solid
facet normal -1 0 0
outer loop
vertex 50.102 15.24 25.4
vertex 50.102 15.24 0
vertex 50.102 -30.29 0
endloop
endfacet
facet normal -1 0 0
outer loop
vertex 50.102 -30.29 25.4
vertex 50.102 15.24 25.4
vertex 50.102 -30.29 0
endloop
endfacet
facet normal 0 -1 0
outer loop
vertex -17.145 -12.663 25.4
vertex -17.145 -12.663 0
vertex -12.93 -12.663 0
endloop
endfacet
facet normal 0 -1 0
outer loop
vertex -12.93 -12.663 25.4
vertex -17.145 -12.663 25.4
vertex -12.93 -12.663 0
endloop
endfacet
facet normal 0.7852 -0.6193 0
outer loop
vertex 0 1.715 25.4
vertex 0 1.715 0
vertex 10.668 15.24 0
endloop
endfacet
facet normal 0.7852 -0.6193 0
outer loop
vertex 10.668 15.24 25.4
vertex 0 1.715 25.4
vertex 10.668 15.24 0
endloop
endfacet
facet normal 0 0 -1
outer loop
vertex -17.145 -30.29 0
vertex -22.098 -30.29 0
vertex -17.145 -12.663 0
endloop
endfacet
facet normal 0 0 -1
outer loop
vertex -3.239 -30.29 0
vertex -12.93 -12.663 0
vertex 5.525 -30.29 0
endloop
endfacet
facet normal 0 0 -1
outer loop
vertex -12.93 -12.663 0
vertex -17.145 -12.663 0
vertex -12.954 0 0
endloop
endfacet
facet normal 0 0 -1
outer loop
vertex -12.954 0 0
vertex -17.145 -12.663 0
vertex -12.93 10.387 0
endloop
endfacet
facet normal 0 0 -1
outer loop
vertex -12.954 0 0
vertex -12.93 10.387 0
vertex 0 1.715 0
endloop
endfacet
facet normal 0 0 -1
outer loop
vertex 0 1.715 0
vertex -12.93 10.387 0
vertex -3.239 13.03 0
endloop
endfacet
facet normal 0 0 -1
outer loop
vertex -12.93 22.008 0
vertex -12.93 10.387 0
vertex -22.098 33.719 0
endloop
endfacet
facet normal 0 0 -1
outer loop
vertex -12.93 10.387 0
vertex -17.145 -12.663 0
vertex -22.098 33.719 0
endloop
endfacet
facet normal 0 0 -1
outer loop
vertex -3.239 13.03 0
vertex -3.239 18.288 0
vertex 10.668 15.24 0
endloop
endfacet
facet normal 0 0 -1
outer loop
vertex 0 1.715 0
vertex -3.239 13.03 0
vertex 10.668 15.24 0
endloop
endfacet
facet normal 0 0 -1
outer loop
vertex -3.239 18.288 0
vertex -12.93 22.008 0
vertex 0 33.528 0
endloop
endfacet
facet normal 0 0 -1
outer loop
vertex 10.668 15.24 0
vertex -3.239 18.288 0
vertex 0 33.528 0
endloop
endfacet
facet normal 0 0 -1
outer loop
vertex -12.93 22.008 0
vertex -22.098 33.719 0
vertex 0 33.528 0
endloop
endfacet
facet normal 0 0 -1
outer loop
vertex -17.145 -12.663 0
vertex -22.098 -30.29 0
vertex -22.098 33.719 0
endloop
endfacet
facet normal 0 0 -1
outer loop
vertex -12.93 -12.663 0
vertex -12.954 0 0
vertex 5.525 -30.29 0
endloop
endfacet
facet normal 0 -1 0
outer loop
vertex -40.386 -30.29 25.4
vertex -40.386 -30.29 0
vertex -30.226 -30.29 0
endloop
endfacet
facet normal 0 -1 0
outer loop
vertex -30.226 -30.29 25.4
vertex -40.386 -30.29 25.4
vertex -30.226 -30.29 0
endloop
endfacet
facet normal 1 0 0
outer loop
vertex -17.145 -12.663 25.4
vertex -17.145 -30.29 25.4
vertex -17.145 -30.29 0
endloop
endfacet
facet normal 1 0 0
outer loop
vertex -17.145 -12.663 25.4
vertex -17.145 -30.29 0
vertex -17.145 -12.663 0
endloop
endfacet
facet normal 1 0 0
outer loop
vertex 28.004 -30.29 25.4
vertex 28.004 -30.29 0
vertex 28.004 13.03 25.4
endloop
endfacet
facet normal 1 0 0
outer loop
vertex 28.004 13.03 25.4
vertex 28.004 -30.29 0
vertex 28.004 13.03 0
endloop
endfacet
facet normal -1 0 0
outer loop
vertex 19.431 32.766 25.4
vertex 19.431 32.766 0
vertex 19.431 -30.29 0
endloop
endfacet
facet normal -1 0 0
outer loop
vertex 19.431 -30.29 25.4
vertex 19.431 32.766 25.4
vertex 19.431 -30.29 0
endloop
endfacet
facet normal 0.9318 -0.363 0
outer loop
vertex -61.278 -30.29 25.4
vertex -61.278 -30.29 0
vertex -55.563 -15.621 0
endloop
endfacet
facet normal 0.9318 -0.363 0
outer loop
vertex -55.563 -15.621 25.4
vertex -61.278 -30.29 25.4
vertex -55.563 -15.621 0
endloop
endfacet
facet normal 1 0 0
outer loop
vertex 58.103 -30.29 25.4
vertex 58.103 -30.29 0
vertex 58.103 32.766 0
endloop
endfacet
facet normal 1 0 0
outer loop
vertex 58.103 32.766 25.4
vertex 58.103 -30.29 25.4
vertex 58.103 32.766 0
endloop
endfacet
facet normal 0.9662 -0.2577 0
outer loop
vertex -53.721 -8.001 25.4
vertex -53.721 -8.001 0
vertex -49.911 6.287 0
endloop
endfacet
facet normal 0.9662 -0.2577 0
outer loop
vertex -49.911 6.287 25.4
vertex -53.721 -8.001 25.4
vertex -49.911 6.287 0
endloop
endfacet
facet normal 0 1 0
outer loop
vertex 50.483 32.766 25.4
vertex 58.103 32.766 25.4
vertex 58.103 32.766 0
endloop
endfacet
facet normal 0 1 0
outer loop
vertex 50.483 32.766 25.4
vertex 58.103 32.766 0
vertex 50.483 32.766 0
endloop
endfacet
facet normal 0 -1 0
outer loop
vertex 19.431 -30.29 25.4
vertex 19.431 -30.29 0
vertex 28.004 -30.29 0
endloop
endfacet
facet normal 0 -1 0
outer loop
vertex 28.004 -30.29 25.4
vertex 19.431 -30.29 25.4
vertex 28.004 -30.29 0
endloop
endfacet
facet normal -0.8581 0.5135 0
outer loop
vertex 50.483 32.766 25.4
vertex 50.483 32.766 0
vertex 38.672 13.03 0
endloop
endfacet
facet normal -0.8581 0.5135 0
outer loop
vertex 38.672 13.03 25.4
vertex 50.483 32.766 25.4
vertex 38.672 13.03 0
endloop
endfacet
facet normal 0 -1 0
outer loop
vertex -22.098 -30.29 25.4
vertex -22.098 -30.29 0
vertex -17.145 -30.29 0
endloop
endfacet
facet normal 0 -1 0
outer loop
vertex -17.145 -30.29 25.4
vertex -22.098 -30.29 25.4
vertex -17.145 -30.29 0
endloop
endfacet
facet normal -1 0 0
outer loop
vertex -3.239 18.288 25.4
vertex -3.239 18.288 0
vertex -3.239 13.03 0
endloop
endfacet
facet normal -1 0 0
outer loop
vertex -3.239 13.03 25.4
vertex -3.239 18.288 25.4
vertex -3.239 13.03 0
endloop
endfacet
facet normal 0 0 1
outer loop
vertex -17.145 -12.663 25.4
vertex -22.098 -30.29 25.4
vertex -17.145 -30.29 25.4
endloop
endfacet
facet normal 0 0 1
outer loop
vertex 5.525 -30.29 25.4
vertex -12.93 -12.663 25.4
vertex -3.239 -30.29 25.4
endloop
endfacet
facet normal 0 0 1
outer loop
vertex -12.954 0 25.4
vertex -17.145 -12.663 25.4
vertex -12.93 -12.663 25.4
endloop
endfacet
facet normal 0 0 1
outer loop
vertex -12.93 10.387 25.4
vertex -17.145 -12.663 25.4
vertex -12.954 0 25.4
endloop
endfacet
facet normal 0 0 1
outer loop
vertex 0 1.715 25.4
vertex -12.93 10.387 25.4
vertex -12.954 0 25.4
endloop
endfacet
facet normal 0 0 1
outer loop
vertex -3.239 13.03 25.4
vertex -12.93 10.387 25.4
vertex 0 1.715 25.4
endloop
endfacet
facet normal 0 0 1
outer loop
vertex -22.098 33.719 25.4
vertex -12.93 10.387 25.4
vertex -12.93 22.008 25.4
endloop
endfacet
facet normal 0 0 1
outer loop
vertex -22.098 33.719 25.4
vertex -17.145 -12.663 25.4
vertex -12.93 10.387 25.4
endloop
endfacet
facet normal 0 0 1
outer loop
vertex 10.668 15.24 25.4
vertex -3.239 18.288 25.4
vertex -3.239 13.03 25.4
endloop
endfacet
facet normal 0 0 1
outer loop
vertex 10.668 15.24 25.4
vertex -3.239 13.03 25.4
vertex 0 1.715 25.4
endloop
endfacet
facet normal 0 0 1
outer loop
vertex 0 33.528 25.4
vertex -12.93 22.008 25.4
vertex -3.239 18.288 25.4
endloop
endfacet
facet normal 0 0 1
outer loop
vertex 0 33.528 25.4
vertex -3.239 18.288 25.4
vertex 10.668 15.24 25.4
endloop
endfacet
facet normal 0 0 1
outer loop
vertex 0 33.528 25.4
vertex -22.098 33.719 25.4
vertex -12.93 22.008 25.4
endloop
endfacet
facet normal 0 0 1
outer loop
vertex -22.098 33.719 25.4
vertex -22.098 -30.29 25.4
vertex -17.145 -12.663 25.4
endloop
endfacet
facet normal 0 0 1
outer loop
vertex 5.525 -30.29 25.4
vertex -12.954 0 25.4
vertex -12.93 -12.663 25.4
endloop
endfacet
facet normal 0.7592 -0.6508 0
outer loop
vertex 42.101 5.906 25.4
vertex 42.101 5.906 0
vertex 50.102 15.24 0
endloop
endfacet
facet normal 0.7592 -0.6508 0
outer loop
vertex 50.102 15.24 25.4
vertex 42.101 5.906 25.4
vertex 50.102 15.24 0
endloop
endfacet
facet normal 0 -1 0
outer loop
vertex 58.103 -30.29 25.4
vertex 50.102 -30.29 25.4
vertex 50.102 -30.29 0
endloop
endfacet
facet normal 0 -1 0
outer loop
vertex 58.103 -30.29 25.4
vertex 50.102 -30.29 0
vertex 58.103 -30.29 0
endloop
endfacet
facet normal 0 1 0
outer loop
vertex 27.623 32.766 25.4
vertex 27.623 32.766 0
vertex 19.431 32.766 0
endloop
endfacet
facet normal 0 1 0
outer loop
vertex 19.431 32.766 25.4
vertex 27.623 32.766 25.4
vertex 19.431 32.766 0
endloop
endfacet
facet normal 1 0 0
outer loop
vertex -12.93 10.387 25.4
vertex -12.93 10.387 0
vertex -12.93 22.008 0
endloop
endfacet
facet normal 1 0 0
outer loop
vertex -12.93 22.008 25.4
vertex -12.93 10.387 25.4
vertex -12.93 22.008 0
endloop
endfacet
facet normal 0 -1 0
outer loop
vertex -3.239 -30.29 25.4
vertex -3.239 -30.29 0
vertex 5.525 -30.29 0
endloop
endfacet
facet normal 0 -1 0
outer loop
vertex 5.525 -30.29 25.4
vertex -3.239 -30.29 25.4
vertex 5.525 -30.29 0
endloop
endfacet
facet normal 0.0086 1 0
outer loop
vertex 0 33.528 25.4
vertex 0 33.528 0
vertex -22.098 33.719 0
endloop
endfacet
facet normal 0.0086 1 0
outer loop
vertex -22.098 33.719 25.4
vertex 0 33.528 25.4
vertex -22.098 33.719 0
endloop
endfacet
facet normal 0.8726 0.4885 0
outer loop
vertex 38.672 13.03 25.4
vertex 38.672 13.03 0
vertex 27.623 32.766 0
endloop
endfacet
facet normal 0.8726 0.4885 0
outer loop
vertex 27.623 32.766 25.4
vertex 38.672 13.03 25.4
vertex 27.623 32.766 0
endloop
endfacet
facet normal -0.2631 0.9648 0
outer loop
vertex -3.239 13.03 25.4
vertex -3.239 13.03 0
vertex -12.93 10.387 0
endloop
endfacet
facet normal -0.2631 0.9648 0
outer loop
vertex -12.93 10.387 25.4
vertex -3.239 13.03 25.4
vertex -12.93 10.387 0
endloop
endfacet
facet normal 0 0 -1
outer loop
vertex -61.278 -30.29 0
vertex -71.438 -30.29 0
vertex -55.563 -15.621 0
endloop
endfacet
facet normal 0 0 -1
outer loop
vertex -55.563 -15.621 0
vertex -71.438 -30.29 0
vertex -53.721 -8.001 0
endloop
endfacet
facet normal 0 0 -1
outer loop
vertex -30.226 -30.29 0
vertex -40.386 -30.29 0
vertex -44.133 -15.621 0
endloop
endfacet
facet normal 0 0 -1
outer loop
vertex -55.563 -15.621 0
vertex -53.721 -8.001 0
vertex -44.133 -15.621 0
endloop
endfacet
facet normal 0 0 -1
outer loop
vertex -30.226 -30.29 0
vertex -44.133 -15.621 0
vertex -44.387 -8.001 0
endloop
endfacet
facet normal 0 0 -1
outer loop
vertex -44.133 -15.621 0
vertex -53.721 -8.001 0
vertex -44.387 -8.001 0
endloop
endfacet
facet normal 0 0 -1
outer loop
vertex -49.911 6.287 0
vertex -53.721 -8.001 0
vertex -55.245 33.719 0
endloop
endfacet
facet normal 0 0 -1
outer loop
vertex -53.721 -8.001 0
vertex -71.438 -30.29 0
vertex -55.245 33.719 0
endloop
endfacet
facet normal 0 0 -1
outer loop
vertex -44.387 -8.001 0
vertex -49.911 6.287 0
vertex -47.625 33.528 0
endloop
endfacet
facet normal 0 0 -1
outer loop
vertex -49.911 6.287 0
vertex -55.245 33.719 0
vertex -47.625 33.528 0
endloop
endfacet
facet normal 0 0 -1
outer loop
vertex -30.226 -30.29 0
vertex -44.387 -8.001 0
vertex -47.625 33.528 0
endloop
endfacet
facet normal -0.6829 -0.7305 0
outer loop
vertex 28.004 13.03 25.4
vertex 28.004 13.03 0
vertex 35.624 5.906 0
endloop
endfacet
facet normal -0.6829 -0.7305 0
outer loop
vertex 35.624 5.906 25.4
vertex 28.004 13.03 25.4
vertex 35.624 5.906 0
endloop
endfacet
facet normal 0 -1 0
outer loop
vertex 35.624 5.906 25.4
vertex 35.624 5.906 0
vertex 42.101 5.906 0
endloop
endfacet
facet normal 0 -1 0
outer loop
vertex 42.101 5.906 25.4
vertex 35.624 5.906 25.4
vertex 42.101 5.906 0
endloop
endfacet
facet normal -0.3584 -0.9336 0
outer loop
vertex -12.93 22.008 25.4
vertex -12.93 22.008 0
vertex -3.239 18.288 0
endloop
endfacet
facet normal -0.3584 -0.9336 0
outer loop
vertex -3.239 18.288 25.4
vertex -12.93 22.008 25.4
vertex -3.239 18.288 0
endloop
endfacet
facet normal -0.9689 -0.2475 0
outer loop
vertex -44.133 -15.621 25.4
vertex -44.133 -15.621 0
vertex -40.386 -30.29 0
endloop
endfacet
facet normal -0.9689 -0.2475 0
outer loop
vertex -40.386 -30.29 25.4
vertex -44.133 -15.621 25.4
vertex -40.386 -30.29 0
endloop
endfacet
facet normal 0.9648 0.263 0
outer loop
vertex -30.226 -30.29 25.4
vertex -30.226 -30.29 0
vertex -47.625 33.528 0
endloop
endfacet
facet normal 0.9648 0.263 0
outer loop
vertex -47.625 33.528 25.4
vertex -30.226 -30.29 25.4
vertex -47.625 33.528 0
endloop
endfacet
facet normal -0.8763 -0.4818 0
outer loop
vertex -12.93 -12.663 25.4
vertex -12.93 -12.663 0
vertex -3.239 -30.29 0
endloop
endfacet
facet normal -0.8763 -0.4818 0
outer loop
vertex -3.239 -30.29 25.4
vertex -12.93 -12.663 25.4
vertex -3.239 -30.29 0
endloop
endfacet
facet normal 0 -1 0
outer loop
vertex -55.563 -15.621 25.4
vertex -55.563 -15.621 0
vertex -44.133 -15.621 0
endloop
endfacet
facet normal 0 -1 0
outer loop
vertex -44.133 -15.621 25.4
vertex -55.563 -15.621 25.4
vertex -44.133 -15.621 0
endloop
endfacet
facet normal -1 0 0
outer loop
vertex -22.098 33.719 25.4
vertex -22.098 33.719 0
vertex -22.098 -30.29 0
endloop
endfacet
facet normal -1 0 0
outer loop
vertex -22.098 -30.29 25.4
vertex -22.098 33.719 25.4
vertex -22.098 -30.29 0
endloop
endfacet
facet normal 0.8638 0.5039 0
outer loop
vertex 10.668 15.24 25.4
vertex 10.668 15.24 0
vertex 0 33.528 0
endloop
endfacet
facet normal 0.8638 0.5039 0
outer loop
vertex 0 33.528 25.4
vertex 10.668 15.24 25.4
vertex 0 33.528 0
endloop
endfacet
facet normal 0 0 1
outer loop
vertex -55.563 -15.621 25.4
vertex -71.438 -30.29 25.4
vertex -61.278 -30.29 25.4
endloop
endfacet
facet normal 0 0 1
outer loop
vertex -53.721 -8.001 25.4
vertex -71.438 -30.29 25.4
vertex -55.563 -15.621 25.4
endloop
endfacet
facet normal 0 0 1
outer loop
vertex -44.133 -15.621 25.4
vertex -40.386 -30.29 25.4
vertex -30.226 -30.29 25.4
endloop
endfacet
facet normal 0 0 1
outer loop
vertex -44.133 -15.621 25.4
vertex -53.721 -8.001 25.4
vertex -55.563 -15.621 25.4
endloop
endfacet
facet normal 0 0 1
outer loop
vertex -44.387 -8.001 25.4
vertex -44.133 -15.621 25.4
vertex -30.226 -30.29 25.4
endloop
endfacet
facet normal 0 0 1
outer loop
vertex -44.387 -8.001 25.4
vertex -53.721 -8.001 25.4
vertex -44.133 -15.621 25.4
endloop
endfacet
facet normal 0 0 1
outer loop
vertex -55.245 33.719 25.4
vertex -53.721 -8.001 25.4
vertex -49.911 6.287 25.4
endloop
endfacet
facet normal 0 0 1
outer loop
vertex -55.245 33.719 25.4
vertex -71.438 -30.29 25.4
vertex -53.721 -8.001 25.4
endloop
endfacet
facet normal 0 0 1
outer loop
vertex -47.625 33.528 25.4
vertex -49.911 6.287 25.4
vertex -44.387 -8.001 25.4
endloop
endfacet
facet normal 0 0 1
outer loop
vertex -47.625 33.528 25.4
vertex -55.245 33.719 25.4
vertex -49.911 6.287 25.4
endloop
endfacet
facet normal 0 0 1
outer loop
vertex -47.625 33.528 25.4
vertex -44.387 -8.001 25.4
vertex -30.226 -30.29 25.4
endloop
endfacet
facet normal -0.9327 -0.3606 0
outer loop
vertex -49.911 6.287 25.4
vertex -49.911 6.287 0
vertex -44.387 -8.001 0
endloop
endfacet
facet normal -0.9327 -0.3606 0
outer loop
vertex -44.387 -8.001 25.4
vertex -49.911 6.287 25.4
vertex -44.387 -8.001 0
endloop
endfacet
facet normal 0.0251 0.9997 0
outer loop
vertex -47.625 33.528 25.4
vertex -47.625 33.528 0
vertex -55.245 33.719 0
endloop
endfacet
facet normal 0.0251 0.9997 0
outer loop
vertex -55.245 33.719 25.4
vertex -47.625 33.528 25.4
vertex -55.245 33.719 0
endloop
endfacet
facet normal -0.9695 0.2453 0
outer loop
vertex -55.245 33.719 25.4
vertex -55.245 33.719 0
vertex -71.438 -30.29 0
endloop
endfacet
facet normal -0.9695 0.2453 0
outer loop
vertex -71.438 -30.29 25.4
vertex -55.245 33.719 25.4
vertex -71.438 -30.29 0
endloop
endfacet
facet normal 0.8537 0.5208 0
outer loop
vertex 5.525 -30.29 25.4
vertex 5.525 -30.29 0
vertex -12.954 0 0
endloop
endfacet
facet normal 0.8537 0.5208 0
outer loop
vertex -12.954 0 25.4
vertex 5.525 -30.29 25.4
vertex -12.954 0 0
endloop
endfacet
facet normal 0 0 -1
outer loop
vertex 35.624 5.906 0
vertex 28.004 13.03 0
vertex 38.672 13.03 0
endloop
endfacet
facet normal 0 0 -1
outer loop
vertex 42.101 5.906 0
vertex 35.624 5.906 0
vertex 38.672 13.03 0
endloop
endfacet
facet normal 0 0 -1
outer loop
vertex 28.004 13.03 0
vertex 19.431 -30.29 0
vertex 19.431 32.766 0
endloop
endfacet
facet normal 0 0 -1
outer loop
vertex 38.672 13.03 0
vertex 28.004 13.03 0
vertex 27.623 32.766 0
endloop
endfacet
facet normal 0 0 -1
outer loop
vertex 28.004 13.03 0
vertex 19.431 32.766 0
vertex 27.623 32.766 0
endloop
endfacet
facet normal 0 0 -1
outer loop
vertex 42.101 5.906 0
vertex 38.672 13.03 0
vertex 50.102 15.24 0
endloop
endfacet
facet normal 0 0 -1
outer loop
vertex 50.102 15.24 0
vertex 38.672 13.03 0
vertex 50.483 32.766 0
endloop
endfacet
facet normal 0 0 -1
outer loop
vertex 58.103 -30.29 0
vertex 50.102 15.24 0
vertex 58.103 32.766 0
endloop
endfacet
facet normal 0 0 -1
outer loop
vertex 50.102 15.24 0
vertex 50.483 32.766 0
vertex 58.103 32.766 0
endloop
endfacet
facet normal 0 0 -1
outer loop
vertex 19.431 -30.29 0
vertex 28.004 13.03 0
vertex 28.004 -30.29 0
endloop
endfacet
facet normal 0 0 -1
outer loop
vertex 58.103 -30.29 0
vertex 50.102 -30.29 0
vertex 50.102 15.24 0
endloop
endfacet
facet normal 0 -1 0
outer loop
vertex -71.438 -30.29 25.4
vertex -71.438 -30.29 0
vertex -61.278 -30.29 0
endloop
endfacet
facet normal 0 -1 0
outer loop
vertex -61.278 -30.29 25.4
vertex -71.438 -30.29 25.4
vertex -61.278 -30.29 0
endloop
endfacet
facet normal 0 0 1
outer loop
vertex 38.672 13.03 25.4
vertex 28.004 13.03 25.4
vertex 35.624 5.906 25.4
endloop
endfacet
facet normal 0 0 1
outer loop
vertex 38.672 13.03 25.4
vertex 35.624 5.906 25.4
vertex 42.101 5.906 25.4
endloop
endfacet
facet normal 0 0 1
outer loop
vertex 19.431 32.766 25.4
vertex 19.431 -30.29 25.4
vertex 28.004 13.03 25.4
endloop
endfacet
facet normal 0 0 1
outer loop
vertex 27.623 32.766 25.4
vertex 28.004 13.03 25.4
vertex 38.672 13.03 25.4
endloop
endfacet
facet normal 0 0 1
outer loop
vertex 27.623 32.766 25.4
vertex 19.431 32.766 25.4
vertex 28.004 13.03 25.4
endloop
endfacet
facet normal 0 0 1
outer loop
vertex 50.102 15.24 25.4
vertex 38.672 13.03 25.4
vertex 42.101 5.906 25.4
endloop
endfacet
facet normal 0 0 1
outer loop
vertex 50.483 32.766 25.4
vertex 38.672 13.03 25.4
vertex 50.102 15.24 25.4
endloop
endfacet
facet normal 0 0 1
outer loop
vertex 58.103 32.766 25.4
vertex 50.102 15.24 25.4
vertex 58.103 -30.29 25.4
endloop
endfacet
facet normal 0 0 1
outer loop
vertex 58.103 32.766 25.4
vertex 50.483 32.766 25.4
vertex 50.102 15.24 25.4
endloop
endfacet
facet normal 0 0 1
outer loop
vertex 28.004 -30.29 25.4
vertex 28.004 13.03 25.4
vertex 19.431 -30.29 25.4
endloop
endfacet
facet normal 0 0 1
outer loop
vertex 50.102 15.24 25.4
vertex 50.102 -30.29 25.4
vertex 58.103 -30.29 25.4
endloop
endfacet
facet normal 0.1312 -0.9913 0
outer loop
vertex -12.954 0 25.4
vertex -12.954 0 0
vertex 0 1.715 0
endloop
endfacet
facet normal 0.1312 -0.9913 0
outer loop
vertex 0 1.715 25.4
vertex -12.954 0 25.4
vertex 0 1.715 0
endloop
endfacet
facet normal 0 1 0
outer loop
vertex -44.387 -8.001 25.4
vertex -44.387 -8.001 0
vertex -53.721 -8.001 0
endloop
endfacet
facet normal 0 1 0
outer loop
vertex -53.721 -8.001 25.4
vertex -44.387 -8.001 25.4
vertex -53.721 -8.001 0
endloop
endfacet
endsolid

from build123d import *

# Parameters (mm, degrees)
F1_DEPTH = 25.4


with BuildPart() as f1:
    # F0 (on Top) → F1 (new body)
    with BuildSketch(Plane.XY):
        Polygon((-47.625023, 33.528017), (-55.245023, 33.718516), (-71.437532, -30.289512), (-61.277532, -30.289512), (-55.562533, -15.621007), (-44.132533, -15.621007), (-40.386017, -30.289512), (-30.226017, -30.289512), align=None)
        Polygon((-44.386521, -8.001003), (-53.721027, -8.001003), (-49.911025, 6.286503), align=None, mode=Mode.SUBTRACT)
        Polygon((-22.098009, 33.718516), (-22.098009, -30.289512), (-17.145008, -30.289512), (-17.145008, -12.663102), (-12.929891, -12.663102), (-3.238501, -30.289512), (5.524502, -30.289512), (-12.954006, 0), (0, 1.714501), (10.668006, 15.240005), (0, 33.528017), align=None)
        Polygon((-12.929891, 10.387408), (-12.929891, 22.007915), (-3.238501, 18.288008), (-3.238501, 13.029637), align=None, mode=Mode.SUBTRACT)
        Polygon((19.431011, 32.766013), (19.431011, -30.289512), (28.003515, -30.289512), (28.003515, 13.029637), (35.623516, 5.905503), (42.100515, 5.905503), (50.10152, 15.240005), (50.10152, -30.289512), (58.102526, -30.289512), (58.102526, 32.766013), (50.482522, 32.766013), (38.671515, 13.029637), (27.622511, 32.766013), align=None)
    extrude(amount=F1_DEPTH)


solid = f1.part
